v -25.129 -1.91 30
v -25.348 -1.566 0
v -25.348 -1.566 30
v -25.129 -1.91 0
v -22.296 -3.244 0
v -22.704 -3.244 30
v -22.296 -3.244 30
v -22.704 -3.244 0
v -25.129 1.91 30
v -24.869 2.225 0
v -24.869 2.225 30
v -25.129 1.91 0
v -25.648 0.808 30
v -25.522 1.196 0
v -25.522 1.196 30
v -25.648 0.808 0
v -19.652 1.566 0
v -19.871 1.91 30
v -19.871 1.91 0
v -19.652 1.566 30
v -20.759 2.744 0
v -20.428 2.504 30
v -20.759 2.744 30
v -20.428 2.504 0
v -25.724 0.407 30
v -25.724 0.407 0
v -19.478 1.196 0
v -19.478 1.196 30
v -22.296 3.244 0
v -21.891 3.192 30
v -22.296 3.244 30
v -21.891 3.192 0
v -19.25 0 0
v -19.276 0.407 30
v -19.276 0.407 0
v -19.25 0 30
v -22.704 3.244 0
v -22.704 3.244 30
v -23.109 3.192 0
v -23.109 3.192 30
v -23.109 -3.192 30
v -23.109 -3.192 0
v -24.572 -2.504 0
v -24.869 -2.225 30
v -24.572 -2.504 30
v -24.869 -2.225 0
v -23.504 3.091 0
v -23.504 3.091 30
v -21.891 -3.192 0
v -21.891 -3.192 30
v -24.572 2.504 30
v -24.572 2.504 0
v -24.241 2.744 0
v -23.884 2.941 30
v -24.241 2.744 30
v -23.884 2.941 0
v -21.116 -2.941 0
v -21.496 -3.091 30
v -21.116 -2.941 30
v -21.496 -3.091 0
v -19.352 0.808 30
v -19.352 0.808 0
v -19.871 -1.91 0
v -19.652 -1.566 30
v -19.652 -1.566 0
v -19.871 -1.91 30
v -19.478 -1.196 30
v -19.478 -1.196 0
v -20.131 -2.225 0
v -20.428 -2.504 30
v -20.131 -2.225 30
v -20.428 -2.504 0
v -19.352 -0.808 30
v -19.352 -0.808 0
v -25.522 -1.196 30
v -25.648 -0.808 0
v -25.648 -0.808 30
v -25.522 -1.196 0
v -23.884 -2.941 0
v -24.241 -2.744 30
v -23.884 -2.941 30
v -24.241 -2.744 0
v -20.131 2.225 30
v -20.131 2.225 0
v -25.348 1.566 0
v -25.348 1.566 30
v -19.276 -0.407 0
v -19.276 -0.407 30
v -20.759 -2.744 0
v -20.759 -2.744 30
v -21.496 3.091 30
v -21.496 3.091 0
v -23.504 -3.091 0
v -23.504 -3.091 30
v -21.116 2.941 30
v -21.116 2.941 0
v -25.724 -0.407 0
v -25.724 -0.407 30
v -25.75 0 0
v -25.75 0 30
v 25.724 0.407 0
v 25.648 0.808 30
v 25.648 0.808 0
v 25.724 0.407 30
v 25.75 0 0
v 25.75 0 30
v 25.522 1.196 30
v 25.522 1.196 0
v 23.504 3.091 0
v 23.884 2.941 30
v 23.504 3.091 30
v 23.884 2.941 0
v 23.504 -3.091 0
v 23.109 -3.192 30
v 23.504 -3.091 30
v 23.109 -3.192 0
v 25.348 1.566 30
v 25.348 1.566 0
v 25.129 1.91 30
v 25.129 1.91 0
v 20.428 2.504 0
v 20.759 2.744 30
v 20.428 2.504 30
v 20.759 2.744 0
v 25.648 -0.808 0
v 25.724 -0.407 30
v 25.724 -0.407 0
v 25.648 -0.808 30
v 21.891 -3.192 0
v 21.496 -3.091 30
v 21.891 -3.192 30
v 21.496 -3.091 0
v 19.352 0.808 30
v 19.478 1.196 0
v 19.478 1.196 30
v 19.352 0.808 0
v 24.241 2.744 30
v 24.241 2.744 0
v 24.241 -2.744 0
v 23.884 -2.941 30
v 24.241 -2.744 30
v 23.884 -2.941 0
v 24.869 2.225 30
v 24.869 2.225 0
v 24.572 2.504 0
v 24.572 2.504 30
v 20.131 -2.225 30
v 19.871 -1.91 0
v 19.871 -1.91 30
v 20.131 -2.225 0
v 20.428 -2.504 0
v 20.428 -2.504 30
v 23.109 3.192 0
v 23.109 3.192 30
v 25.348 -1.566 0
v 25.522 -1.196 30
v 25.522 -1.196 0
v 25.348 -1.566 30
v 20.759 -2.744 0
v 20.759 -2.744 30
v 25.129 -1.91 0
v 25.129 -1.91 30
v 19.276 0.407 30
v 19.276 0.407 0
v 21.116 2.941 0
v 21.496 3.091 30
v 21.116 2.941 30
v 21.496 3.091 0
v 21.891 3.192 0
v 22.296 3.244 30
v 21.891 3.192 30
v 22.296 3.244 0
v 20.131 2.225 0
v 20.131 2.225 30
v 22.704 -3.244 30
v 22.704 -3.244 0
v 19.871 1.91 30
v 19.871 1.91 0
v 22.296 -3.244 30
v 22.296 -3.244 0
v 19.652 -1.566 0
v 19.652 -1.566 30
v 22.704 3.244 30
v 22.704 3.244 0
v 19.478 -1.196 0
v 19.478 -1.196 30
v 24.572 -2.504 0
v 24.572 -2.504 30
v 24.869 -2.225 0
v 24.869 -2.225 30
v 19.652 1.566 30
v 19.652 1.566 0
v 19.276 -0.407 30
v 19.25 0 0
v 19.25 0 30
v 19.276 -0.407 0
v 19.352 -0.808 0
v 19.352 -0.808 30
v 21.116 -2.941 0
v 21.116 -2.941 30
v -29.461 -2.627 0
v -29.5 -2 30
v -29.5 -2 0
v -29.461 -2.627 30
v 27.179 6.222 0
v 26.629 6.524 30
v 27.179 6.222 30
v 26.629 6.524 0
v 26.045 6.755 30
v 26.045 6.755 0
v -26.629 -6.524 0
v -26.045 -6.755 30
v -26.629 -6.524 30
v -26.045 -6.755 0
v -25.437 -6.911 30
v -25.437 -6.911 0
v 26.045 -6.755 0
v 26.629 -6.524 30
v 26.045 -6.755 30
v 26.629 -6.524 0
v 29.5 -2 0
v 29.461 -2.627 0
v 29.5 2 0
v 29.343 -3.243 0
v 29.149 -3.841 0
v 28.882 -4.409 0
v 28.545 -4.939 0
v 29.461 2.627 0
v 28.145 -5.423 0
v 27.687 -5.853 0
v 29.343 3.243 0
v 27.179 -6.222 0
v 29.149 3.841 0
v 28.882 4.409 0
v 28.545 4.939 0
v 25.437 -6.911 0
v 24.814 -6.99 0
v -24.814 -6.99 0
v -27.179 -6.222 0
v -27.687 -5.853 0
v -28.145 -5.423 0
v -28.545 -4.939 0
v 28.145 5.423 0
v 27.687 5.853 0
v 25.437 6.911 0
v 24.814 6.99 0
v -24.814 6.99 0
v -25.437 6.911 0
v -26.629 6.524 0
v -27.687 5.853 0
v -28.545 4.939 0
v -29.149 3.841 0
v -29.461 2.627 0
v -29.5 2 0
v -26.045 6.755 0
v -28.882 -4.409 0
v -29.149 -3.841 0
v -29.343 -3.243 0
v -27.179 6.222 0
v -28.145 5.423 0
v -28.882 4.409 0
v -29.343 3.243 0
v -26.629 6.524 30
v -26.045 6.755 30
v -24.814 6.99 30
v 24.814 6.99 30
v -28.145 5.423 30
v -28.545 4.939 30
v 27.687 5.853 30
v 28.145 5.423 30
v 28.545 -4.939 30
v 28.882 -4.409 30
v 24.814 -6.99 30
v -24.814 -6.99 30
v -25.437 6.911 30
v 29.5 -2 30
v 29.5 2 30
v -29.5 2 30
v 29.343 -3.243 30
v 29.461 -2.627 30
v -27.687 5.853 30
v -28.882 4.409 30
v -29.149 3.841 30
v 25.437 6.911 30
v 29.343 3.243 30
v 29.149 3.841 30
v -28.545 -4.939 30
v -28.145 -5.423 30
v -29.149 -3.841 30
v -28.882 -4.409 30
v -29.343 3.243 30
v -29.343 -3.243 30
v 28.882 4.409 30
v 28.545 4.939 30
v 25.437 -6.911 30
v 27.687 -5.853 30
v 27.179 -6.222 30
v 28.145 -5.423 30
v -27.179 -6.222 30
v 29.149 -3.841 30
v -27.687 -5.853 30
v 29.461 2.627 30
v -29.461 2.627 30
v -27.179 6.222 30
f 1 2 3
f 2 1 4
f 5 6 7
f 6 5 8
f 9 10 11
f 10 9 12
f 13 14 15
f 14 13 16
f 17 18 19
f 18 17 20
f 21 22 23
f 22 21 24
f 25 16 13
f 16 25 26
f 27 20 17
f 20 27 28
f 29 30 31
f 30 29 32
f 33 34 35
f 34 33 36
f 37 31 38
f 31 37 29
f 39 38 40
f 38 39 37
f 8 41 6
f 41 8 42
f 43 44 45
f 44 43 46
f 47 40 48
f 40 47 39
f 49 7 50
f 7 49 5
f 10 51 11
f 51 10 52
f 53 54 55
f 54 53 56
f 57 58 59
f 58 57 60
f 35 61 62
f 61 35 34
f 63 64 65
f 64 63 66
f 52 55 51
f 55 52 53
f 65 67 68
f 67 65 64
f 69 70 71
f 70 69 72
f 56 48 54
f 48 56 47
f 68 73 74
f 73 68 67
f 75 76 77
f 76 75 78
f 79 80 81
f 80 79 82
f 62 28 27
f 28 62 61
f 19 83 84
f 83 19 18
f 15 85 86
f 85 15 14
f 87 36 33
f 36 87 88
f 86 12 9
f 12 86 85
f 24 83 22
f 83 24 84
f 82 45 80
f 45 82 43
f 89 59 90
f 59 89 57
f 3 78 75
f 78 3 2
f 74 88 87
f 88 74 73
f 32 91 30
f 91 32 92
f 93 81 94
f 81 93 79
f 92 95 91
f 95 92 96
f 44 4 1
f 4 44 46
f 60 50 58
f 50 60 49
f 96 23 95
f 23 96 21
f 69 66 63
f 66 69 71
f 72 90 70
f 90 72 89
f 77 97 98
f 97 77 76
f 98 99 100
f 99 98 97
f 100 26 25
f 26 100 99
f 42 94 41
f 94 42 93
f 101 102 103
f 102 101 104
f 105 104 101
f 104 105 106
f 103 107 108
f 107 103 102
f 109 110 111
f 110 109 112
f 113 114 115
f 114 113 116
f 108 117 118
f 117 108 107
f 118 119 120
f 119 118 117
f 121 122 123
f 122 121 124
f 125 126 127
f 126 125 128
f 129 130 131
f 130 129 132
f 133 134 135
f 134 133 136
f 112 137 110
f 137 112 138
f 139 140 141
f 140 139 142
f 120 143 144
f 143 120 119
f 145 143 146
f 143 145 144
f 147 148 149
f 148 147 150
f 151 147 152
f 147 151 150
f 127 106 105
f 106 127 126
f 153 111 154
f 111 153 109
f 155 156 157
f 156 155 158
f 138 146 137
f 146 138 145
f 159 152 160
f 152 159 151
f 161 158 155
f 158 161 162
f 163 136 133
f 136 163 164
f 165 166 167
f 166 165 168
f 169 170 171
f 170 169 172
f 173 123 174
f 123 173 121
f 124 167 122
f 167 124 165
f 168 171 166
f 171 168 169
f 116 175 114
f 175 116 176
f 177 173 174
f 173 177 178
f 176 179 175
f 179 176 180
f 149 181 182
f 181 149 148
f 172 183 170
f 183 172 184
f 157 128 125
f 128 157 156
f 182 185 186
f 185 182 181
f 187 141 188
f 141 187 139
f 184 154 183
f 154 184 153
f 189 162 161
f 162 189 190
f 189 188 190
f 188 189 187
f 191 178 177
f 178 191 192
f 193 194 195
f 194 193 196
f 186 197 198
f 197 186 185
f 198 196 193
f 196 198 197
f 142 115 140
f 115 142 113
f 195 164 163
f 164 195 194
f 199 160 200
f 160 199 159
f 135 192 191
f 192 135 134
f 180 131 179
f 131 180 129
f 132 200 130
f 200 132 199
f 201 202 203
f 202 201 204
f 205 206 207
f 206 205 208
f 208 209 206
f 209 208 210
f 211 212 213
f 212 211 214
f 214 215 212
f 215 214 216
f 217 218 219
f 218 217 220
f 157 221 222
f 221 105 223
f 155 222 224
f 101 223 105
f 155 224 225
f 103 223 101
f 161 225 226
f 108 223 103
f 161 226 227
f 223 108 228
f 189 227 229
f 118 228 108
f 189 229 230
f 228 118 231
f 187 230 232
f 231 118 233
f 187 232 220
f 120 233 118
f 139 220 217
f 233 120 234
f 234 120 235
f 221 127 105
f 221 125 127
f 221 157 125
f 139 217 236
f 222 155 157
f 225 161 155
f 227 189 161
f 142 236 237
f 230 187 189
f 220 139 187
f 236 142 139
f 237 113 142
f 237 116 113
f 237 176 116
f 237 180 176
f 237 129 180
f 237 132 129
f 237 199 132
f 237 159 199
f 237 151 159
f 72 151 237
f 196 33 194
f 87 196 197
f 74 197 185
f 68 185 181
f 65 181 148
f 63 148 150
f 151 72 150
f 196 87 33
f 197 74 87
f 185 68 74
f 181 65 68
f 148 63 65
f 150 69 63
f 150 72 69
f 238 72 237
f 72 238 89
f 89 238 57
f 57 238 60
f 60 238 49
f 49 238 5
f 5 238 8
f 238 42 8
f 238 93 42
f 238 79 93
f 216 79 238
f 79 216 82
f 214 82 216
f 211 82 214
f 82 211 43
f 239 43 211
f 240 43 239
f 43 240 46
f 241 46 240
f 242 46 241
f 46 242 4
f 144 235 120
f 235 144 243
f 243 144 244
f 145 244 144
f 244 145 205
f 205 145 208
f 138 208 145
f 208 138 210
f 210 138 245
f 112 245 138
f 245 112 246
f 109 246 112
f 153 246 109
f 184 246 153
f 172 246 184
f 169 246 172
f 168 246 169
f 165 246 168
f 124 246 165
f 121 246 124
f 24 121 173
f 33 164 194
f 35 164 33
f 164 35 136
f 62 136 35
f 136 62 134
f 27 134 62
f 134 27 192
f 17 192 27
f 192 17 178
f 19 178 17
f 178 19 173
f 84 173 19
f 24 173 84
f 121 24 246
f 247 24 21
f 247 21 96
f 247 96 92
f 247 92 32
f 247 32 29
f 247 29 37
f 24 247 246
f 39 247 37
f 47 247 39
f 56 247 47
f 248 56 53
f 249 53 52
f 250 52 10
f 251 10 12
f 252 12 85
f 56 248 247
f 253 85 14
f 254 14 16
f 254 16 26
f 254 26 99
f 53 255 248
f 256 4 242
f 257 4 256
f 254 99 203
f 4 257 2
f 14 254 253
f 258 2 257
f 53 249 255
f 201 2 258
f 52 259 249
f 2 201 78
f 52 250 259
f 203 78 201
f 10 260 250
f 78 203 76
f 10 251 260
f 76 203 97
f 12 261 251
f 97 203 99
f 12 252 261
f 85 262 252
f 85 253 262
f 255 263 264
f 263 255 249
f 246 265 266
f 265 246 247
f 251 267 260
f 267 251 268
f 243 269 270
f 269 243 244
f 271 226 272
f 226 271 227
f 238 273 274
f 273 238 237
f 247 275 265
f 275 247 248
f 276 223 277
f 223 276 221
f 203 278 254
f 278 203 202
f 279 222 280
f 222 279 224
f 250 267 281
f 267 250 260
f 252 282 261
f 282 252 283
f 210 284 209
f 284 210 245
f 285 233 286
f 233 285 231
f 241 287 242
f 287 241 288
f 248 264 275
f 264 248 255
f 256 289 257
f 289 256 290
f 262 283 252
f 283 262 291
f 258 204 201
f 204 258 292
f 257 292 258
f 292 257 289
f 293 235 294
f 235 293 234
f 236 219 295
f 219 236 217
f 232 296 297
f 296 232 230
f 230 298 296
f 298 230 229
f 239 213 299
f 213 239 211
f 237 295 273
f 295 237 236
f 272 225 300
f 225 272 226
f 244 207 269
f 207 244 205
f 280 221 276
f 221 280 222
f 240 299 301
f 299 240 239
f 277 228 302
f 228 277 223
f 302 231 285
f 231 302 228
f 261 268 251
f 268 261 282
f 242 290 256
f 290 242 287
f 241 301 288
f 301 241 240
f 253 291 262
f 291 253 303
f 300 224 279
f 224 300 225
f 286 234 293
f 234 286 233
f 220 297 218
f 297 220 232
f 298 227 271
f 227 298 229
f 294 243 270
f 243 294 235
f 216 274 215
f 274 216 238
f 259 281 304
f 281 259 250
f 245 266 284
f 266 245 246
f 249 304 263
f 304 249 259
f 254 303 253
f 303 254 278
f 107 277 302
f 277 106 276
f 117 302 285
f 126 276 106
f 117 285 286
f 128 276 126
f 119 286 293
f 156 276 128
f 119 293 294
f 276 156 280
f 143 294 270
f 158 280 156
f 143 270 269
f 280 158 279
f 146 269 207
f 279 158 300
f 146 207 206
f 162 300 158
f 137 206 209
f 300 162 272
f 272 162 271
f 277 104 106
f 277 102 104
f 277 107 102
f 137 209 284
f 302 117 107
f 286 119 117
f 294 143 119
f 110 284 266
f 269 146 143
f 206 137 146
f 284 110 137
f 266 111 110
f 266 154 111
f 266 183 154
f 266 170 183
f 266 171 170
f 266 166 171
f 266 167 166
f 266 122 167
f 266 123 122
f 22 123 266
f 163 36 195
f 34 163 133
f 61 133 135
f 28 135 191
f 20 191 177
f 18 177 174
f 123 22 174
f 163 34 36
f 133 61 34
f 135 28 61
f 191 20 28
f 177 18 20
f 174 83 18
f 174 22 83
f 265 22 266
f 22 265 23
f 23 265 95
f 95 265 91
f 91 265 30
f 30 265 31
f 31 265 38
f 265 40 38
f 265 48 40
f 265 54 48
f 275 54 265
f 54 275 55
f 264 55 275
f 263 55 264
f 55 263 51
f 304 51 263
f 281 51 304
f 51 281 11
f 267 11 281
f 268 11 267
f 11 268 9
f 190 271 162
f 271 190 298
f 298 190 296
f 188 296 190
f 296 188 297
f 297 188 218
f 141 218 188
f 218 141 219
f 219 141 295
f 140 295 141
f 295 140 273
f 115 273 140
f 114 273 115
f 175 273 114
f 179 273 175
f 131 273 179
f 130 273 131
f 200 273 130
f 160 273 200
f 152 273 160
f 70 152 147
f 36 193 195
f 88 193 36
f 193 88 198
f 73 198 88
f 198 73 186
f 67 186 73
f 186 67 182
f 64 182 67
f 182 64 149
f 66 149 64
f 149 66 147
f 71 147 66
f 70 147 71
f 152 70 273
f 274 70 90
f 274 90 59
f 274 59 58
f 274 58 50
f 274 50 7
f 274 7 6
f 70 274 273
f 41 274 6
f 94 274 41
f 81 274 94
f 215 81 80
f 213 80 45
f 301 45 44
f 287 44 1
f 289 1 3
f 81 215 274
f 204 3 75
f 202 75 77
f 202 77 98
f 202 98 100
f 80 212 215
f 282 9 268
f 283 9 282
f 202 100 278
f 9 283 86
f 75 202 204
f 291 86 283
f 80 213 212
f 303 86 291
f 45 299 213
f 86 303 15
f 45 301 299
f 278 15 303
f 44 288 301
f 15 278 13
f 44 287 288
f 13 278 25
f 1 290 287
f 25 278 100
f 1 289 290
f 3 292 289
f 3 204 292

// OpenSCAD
$fn = 50;


difference() {
	union() {
		hull() {
			translate(v = [-24.5000000000, 2.0000000000, 0]) {
				cylinder(h = 30, r = 5);
			}
			translate(v = [24.5000000000, 2.0000000000, 0]) {
				cylinder(h = 30, r = 5);
			}
			translate(v = [-24.5000000000, -2.0000000000, 0]) {
				cylinder(h = 30, r = 5);
			}
			translate(v = [24.5000000000, -2.0000000000, 0]) {
				cylinder(h = 30, r = 5);
			}
		}
	}
	union() {
		translate(v = [-22.5000000000, 0.0000000000, -100.0000000000]) {
			cylinder(h = 200, r = 3.2500000000);
		}
		translate(v = [-22.5000000000, 0.0000000000, -100.0000000000]) {
			cylinder(h = 200, r = 3.2500000000);
		}
		translate(v = [22.5000000000, 0.0000000000, -100.0000000000]) {
			cylinder(h = 200, r = 3.2500000000);
		}
		translate(v = [22.5000000000, 0.0000000000, -100.0000000000]) {
			cylinder(h = 200, r = 3.2500000000);
		}
	}
}
